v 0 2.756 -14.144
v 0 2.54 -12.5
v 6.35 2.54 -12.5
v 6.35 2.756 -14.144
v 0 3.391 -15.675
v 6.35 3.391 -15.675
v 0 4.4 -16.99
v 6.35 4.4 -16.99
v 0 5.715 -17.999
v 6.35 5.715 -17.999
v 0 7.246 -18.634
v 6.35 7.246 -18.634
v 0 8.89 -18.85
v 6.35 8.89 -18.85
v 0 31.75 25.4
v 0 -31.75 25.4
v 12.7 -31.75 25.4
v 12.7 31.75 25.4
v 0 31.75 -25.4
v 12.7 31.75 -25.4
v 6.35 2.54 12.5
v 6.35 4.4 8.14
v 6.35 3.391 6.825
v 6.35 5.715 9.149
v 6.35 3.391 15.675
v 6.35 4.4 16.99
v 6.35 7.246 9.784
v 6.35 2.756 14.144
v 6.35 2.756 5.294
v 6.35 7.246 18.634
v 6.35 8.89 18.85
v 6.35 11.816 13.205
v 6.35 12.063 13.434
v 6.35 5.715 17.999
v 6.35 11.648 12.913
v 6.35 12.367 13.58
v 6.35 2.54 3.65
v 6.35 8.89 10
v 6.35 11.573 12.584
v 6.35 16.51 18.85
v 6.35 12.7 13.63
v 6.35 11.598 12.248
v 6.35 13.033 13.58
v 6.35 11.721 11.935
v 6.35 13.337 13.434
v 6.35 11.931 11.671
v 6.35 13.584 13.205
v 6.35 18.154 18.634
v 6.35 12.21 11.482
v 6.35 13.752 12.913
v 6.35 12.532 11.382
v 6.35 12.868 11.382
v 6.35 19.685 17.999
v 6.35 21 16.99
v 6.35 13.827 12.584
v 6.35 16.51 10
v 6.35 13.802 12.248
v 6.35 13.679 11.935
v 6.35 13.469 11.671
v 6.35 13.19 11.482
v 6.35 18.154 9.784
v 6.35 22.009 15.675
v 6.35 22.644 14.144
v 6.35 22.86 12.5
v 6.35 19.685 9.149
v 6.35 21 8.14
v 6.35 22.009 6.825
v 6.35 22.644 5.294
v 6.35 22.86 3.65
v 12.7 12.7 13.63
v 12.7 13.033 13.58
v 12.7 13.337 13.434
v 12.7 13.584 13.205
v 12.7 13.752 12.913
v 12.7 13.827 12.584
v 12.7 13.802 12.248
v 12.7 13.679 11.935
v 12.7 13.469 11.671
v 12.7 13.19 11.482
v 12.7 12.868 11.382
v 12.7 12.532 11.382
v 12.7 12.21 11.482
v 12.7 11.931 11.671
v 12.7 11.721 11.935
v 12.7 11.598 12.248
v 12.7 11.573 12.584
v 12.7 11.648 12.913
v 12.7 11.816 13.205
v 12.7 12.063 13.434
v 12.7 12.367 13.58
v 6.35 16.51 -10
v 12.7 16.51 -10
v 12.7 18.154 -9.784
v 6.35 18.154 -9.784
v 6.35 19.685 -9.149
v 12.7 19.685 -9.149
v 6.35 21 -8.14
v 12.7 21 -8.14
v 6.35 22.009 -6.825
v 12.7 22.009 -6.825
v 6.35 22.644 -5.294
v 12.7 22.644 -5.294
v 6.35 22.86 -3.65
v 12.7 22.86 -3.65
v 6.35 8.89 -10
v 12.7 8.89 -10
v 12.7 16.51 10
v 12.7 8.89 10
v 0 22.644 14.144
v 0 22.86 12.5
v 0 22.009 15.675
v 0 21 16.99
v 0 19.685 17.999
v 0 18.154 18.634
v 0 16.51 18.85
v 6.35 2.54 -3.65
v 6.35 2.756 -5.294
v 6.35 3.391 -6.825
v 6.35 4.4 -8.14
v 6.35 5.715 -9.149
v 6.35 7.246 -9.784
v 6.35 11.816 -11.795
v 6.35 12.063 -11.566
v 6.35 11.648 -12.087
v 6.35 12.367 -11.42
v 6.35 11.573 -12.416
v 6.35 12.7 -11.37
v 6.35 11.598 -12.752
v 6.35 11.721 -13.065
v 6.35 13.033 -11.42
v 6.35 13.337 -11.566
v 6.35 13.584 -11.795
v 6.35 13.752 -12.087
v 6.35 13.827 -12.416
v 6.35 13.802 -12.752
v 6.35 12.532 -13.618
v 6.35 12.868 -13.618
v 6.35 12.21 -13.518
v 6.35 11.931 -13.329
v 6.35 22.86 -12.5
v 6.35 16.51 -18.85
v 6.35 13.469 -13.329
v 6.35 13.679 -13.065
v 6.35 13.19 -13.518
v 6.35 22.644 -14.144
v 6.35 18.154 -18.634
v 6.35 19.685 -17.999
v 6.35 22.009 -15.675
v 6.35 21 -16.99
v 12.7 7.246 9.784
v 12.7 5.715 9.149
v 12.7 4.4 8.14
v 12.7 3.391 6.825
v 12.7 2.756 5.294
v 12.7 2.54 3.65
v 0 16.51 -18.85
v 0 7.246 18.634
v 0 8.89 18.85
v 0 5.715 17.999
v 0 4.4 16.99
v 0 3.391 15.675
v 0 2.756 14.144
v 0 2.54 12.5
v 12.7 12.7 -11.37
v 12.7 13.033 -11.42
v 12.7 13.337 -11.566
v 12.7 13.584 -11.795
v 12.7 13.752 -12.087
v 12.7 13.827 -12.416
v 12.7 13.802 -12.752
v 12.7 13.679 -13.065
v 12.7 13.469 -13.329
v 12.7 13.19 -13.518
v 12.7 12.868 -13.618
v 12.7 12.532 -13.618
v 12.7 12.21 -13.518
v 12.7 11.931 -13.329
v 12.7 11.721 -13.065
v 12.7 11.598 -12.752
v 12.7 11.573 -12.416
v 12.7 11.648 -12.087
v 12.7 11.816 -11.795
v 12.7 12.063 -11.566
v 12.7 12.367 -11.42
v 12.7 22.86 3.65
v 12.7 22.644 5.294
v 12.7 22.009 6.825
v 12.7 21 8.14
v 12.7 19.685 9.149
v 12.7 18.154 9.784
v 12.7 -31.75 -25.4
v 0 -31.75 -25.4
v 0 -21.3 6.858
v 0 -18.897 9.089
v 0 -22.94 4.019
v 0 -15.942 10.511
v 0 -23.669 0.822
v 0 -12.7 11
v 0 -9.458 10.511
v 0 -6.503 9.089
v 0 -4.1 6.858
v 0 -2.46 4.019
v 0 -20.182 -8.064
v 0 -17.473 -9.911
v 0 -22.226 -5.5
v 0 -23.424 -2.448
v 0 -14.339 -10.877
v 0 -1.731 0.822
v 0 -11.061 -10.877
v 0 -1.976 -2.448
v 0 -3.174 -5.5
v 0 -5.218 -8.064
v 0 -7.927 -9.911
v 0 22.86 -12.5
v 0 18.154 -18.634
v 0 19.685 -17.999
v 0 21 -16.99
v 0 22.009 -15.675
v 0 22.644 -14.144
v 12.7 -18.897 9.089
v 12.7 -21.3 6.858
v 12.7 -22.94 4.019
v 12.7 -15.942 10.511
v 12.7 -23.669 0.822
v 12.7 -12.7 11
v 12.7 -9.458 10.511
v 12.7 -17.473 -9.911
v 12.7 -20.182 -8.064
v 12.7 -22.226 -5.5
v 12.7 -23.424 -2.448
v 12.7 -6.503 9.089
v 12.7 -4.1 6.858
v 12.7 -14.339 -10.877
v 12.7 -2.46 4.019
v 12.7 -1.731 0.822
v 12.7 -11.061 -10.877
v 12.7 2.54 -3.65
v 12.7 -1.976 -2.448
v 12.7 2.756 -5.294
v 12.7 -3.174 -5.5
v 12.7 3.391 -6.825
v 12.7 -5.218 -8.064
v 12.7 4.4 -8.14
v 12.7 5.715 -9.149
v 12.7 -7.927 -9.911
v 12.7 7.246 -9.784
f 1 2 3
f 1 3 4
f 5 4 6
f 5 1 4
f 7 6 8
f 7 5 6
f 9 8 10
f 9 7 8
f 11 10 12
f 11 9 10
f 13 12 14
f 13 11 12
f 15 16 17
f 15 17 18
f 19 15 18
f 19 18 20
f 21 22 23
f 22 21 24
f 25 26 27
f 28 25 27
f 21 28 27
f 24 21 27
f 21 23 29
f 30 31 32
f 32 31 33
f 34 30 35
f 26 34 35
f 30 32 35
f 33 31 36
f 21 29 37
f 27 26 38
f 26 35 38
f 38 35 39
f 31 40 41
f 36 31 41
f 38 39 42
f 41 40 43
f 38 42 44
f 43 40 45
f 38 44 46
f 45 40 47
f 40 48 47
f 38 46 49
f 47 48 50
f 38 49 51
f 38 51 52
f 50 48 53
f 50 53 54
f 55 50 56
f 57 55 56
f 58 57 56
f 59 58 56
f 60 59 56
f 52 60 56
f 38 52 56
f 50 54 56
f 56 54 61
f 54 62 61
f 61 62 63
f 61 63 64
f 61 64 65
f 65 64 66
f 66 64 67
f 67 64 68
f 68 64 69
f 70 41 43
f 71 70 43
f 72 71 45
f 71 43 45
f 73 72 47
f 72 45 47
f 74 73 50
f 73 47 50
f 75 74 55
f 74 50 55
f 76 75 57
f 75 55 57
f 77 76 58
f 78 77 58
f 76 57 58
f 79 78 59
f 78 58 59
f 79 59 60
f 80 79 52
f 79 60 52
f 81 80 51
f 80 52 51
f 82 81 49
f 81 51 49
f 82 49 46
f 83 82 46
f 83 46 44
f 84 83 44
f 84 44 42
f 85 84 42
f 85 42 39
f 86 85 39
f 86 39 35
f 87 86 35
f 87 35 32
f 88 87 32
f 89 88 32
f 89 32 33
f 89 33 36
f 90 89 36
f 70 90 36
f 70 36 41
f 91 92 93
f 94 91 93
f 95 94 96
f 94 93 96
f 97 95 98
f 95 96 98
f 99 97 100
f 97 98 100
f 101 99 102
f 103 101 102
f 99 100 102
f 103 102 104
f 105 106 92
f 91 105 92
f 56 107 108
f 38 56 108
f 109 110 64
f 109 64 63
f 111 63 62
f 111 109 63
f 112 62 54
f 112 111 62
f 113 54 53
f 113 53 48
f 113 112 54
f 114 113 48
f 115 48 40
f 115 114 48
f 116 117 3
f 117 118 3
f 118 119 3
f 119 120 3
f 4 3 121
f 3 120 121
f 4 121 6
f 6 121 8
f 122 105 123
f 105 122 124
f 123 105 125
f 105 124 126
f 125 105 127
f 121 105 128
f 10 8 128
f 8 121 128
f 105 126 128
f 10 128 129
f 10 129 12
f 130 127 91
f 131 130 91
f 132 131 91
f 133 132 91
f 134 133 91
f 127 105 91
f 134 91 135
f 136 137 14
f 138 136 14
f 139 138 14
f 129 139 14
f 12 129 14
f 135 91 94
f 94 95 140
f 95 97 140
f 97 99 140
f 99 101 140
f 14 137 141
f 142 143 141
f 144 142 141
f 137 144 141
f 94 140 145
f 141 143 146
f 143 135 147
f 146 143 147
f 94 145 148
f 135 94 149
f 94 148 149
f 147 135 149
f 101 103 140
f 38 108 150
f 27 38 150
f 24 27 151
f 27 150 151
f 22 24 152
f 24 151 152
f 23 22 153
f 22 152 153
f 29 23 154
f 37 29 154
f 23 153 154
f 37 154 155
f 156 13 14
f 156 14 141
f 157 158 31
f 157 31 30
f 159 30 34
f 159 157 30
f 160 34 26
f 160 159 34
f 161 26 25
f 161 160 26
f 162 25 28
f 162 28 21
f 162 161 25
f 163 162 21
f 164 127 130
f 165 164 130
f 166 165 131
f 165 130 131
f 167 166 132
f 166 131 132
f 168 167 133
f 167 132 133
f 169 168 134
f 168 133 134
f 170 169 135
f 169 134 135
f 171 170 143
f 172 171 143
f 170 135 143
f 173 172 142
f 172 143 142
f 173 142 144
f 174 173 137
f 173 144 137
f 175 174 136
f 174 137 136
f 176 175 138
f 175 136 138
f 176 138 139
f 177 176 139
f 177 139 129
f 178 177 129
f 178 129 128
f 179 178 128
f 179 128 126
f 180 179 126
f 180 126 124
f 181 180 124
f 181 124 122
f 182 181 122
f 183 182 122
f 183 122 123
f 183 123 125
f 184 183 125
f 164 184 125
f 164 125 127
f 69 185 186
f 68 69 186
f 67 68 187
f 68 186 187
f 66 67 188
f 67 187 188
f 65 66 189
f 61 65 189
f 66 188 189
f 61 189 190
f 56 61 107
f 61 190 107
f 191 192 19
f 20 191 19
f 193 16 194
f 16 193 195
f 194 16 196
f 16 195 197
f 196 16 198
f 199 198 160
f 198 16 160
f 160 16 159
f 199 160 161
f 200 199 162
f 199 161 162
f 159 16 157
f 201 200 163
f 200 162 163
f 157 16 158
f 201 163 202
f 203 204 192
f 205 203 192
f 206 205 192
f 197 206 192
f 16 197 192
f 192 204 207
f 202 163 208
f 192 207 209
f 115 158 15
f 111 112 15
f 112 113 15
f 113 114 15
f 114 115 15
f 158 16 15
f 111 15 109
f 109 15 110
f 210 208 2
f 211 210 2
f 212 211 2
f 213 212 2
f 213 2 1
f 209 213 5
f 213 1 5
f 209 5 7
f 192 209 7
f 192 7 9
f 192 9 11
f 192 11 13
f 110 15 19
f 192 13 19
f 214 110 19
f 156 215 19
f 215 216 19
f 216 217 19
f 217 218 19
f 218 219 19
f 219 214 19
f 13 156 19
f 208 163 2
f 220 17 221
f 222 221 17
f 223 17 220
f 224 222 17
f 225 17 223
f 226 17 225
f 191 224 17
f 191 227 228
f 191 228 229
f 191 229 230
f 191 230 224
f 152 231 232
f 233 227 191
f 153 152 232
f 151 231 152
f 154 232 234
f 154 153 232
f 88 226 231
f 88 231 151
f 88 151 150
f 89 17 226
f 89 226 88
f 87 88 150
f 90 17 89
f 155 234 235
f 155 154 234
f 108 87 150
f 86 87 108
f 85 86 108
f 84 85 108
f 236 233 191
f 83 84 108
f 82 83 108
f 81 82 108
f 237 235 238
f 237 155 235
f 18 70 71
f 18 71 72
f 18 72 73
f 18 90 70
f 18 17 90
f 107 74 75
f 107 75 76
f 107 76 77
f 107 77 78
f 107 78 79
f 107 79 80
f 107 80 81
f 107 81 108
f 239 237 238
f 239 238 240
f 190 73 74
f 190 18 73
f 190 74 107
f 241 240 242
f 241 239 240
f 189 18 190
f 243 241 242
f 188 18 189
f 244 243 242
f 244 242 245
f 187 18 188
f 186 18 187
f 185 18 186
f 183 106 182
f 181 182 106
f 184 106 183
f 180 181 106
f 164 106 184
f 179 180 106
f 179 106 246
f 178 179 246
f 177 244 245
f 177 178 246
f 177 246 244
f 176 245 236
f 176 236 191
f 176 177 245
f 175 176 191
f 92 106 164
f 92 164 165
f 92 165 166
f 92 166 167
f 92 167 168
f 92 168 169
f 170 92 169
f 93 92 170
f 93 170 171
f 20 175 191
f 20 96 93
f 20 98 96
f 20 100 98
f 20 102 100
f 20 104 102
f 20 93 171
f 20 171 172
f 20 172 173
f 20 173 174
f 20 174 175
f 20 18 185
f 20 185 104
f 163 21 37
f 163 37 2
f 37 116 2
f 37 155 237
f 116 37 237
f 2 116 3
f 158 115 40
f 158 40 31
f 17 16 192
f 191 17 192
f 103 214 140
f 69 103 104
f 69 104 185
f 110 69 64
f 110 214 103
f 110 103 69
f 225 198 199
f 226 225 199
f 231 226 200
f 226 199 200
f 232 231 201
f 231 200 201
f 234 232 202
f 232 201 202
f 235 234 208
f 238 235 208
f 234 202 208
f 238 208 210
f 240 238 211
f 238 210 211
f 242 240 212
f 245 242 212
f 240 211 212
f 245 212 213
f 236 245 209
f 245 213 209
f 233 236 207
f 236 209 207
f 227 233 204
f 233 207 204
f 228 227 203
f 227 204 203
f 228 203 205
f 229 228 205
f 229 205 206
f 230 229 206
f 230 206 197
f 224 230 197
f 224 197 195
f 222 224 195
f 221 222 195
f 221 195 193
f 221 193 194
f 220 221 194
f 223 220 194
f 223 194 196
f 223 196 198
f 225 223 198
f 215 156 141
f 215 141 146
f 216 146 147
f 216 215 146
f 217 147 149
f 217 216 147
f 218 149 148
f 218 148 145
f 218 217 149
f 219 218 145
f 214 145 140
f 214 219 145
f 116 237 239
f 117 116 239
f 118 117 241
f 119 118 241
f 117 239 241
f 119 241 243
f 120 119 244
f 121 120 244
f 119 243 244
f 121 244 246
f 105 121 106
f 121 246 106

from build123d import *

# Parameters (mm, degrees)
SKETCH1_W                  = 50.8
SKETCH1_H                  = 63.5
BOSS_EXTRUDE1_DEPTH        = 12.7
F_22_0_22_DIAMETER_HOLE1_D = 22
F_4_40_TAPPED_HOLE1_D      = 2.2606
CUT_EXTRUDE1_DEPTH         = 43.597094971
CUT_EXTRUDE2_DEPTH         = 6.35


with BuildPart() as part:
    # Sketch1 → Boss-Extrude1 (new body)
    with BuildSketch(Plane(origin=(0, 0, 0), x_dir=(0, 0, -1), z_dir=(1, 0, 0))):
        Rectangle(SKETCH1_W, SKETCH1_H)
    extrude(amount=BOSS_EXTRUDE1_DEPTH)

    # Ø22.0 (22) Diameter Hole1 (through all)
    with Locations(Plane(origin=(12.7, 0, 0), x_dir=(0, 0, -1), z_dir=(1, 0, 0))):
        with Locations((0, -12.7)):
            Hole(F_22_0_22_DIAMETER_HOLE1_D / 2)

    # Sketch4 → 1/16 NPT Tapped Hole1 (revolve, cut)
    with BuildSketch(Plane.ZX.offset(12.7)):
        Polygon((0, 0), (0, 13.530685027), (3.0734, 11.684), (3.0734, 6.858), (3.762574096, 6.858), (3.9679118, 0), align=None)
    revolve(axis=Axis((-6.35, 12.7, 0), (1, 0, 0)), mode=Mode.SUBTRACT)

    # #4-40 Tapped Hole1 (through all)
    with Locations(Plane(origin=(12.7, 0, 0), x_dir=(0, 0, -1), z_dir=(1, 0, 0))):
        with Locations((-12.5, 12.7), (12.5, 12.7)):
            Hole(F_4_40_TAPPED_HOLE1_D / 2)

    # Sketch9 → Cut-Extrude1 (cut, through all)
    with BuildSketch(Plane(origin=(12.7, 0, 0), x_dir=(0, 0, -1), z_dir=(1, 0, 0))):
        with BuildLine():
            Line((-3.65, 2.54), (3.65, 2.54))
            ThreePointArc((3.65, 2.54), (8.140128061, 4.399871939), (10, 8.89))
            Line((10, 8.89), (10, 16.51))
            ThreePointArc((10, 16.51), (8.140128061, 21.000128061), (3.65, 22.86))
            Line((3.65, 22.86), (-3.65, 22.86))
            ThreePointArc((-3.65, 22.86), (-8.140128061, 21.000128061), (-10, 16.51))
            Line((-10, 16.51), (-10, 8.89))
            ThreePointArc((-10, 8.89), (-8.140128061, 4.399871939), (-3.65, 2.54))
        make_face()
    extrude(amount=-CUT_EXTRUDE1_DEPTH, mode=Mode.SUBTRACT)

    # Sketch10 → Cut-Extrude2 (cut)
    with BuildSketch(Plane(origin=(0, 0, 0), x_dir=(0, 0, -1), z_dir=(1, 0, 0))):
        with BuildLine():
            Line((-12.5, 2.54), (12.5, 2.54))
            ThreePointArc((12.5, 2.54), (16.990128061, 4.399871939), (18.85, 8.89))
            Line((18.85, 8.89), (18.85, 16.51))
            ThreePointArc((18.85, 16.51), (16.990128061, 21.000128061), (12.5, 22.86))
            Line((12.5, 22.86), (-12.5, 22.86))
            ThreePointArc((-12.5, 22.86), (-16.990128061, 21.000128061), (-18.85, 16.51))
            Line((-18.85, 16.51), (-18.85, 8.89))
            ThreePointArc((-18.85, 8.89), (-16.990128061, 4.399871939), (-12.5, 2.54))
        make_face()
    extrude(amount=CUT_EXTRUDE2_DEPTH, mode=Mode.SUBTRACT)


solid = part.part
